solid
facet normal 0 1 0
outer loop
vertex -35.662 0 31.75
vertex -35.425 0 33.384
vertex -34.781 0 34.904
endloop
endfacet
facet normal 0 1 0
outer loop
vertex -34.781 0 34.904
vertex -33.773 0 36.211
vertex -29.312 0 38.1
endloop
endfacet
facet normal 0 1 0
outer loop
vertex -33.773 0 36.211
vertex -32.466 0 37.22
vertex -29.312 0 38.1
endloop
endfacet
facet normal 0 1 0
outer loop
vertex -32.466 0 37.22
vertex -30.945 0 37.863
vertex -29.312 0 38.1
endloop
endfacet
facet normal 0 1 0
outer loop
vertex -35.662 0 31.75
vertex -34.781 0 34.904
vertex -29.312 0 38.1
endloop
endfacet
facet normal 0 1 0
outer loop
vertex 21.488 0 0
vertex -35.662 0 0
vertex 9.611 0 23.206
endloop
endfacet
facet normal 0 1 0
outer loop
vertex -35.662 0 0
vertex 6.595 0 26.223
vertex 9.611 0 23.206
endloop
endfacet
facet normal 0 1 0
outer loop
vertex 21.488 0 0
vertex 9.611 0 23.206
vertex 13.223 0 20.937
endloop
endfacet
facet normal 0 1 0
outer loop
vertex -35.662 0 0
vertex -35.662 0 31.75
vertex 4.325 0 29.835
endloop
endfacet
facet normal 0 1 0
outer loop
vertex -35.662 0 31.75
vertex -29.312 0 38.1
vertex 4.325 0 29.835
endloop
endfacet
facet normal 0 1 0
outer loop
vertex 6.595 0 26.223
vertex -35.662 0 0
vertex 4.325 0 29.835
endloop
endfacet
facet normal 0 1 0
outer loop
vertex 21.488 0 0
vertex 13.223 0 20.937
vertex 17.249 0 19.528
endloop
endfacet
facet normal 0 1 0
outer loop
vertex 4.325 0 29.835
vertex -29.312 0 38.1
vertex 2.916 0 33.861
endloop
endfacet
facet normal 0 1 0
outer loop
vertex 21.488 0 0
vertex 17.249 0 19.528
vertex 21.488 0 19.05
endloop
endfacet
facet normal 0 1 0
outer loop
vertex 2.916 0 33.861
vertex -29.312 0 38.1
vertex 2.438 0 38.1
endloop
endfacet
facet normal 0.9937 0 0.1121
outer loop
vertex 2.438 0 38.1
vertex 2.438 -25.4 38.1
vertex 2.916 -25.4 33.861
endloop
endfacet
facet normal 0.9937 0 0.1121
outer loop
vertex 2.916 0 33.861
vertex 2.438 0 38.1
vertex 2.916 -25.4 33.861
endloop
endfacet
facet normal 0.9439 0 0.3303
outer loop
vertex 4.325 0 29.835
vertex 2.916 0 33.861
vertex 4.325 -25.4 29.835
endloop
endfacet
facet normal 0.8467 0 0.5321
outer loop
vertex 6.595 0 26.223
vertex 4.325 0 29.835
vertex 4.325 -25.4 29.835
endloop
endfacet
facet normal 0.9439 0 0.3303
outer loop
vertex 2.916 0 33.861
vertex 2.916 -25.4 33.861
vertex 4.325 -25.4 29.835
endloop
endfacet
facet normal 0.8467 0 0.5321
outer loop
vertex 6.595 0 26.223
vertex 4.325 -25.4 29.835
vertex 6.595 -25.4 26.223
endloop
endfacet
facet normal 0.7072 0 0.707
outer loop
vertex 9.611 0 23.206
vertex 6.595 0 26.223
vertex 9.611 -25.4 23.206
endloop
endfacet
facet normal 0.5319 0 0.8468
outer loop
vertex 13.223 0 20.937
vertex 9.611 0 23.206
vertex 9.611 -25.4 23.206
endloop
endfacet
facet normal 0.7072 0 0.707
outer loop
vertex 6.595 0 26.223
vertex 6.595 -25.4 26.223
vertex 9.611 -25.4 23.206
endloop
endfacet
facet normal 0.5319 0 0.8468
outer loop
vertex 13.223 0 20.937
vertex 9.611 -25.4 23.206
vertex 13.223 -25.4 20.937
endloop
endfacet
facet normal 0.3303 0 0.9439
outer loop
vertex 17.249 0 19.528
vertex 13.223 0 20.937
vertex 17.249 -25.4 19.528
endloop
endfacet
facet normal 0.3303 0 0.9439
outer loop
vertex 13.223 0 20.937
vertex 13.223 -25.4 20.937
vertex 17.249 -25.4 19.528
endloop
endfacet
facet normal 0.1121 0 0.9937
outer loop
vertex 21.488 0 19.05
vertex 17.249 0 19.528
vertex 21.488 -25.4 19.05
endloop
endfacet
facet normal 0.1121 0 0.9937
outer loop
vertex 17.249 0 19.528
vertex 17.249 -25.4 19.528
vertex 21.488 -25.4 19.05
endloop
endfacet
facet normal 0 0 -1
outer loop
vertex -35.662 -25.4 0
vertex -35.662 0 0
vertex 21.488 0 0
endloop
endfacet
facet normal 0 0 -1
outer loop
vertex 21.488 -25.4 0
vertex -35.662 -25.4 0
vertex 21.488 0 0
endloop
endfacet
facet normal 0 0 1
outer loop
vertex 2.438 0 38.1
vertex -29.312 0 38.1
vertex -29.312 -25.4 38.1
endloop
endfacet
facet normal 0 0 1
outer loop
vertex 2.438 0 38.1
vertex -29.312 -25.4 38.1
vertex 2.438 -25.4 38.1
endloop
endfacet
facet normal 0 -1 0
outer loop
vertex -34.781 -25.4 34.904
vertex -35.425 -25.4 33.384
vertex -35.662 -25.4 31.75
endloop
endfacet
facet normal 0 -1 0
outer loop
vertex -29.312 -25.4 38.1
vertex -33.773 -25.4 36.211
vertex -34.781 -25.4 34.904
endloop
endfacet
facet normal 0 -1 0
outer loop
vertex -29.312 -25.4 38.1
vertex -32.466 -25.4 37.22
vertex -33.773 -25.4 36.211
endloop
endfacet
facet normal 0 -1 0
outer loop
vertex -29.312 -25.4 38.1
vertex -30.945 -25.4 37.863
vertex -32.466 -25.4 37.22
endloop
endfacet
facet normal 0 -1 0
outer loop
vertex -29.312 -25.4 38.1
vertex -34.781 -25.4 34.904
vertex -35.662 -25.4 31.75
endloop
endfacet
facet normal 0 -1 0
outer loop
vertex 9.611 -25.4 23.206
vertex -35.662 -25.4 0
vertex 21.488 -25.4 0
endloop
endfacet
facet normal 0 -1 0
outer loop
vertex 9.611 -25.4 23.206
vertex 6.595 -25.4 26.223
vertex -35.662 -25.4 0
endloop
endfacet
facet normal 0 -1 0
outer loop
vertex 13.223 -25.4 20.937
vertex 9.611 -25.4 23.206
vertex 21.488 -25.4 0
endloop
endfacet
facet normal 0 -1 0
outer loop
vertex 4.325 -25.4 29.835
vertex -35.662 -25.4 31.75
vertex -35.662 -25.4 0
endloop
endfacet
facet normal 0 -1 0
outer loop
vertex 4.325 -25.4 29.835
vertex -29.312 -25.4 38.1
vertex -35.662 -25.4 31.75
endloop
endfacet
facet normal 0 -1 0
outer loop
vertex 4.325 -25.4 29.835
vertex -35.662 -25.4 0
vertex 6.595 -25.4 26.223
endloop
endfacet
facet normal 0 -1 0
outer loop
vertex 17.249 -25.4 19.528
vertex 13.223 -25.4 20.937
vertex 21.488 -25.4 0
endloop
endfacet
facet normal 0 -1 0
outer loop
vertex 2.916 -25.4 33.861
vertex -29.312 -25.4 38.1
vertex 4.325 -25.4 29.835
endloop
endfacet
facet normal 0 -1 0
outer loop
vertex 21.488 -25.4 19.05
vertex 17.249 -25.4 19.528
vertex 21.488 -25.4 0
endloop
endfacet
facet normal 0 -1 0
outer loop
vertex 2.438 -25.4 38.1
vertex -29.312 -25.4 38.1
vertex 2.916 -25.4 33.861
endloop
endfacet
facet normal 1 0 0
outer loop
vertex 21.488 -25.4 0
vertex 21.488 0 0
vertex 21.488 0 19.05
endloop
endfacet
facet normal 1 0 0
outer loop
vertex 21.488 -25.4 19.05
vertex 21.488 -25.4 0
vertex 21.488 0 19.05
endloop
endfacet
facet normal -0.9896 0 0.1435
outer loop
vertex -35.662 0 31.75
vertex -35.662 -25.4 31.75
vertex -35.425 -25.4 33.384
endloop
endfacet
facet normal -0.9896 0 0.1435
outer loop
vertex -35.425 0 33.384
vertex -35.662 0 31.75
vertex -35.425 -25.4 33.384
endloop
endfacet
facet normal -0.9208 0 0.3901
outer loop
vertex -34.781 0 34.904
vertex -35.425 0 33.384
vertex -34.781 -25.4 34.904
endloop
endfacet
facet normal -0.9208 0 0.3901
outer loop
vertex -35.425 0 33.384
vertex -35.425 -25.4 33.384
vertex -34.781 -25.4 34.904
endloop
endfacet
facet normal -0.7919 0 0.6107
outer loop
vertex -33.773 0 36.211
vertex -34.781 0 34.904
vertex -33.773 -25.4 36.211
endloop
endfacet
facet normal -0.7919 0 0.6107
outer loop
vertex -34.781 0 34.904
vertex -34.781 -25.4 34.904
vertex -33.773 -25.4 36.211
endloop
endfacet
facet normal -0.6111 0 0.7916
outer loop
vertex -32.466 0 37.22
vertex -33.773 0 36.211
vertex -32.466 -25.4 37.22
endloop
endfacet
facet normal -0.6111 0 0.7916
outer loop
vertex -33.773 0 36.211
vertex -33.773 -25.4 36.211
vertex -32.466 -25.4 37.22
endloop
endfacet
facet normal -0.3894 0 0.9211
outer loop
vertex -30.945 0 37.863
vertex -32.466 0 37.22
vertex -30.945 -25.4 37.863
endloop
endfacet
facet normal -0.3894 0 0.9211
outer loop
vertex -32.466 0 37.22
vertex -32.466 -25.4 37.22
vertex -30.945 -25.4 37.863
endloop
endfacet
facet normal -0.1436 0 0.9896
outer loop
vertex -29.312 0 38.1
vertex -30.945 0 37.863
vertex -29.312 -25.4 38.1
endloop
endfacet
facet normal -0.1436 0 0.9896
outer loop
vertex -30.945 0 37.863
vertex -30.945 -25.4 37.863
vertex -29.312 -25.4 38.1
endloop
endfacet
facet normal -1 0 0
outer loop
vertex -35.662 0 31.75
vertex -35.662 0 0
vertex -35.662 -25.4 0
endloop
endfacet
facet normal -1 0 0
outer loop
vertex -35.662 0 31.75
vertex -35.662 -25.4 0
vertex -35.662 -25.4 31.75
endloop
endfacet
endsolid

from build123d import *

# Parameters (mm, degrees)
F0_W     = 57.15
F0_H     = 38.1
F1_DEPTH = 25.4
F3_DEPTH = 25.4
F5_DEPTH = 25.4


with BuildPart() as f1:
    # F0 (on Front) → F1 (new body)
    with BuildSketch(Plane.XZ):
        with Locations((-7.0866, 19.05)):
            Rectangle(F0_W, F0_H)
    extrude(amount=F1_DEPTH)

    # F2 (on face) → F3 (cut)
    with BuildSketch(Plane.XZ.offset(25.4)):
        with BuildLine():
            Line((21.4884, 38.1), (2.4384, 38.1))
            ThreePointArc((2.4384, 38.1), (8.018016, 24.629616), (21.4884, 19.05))
            Line((21.4884, 19.05), (21.4884, 38.1))
        make_face()
    extrude(amount=-F3_DEPTH, mode=Mode.SUBTRACT)

    # F4 (on face) → F5 (cut)
    with BuildSketch(Plane.XZ.offset(25.4)):
        with BuildLine():
            ThreePointArc((-35.6616, 31.75), (-33.772823, 36.211223), (-29.3116, 38.1))
            Line((-29.3116, 38.1), (-35.6616, 38.1))
            Line((-35.6616, 38.1), (-35.6616, 31.75))
        make_face()
    extrude(amount=-F5_DEPTH, mode=Mode.SUBTRACT)


solid = f1.part
